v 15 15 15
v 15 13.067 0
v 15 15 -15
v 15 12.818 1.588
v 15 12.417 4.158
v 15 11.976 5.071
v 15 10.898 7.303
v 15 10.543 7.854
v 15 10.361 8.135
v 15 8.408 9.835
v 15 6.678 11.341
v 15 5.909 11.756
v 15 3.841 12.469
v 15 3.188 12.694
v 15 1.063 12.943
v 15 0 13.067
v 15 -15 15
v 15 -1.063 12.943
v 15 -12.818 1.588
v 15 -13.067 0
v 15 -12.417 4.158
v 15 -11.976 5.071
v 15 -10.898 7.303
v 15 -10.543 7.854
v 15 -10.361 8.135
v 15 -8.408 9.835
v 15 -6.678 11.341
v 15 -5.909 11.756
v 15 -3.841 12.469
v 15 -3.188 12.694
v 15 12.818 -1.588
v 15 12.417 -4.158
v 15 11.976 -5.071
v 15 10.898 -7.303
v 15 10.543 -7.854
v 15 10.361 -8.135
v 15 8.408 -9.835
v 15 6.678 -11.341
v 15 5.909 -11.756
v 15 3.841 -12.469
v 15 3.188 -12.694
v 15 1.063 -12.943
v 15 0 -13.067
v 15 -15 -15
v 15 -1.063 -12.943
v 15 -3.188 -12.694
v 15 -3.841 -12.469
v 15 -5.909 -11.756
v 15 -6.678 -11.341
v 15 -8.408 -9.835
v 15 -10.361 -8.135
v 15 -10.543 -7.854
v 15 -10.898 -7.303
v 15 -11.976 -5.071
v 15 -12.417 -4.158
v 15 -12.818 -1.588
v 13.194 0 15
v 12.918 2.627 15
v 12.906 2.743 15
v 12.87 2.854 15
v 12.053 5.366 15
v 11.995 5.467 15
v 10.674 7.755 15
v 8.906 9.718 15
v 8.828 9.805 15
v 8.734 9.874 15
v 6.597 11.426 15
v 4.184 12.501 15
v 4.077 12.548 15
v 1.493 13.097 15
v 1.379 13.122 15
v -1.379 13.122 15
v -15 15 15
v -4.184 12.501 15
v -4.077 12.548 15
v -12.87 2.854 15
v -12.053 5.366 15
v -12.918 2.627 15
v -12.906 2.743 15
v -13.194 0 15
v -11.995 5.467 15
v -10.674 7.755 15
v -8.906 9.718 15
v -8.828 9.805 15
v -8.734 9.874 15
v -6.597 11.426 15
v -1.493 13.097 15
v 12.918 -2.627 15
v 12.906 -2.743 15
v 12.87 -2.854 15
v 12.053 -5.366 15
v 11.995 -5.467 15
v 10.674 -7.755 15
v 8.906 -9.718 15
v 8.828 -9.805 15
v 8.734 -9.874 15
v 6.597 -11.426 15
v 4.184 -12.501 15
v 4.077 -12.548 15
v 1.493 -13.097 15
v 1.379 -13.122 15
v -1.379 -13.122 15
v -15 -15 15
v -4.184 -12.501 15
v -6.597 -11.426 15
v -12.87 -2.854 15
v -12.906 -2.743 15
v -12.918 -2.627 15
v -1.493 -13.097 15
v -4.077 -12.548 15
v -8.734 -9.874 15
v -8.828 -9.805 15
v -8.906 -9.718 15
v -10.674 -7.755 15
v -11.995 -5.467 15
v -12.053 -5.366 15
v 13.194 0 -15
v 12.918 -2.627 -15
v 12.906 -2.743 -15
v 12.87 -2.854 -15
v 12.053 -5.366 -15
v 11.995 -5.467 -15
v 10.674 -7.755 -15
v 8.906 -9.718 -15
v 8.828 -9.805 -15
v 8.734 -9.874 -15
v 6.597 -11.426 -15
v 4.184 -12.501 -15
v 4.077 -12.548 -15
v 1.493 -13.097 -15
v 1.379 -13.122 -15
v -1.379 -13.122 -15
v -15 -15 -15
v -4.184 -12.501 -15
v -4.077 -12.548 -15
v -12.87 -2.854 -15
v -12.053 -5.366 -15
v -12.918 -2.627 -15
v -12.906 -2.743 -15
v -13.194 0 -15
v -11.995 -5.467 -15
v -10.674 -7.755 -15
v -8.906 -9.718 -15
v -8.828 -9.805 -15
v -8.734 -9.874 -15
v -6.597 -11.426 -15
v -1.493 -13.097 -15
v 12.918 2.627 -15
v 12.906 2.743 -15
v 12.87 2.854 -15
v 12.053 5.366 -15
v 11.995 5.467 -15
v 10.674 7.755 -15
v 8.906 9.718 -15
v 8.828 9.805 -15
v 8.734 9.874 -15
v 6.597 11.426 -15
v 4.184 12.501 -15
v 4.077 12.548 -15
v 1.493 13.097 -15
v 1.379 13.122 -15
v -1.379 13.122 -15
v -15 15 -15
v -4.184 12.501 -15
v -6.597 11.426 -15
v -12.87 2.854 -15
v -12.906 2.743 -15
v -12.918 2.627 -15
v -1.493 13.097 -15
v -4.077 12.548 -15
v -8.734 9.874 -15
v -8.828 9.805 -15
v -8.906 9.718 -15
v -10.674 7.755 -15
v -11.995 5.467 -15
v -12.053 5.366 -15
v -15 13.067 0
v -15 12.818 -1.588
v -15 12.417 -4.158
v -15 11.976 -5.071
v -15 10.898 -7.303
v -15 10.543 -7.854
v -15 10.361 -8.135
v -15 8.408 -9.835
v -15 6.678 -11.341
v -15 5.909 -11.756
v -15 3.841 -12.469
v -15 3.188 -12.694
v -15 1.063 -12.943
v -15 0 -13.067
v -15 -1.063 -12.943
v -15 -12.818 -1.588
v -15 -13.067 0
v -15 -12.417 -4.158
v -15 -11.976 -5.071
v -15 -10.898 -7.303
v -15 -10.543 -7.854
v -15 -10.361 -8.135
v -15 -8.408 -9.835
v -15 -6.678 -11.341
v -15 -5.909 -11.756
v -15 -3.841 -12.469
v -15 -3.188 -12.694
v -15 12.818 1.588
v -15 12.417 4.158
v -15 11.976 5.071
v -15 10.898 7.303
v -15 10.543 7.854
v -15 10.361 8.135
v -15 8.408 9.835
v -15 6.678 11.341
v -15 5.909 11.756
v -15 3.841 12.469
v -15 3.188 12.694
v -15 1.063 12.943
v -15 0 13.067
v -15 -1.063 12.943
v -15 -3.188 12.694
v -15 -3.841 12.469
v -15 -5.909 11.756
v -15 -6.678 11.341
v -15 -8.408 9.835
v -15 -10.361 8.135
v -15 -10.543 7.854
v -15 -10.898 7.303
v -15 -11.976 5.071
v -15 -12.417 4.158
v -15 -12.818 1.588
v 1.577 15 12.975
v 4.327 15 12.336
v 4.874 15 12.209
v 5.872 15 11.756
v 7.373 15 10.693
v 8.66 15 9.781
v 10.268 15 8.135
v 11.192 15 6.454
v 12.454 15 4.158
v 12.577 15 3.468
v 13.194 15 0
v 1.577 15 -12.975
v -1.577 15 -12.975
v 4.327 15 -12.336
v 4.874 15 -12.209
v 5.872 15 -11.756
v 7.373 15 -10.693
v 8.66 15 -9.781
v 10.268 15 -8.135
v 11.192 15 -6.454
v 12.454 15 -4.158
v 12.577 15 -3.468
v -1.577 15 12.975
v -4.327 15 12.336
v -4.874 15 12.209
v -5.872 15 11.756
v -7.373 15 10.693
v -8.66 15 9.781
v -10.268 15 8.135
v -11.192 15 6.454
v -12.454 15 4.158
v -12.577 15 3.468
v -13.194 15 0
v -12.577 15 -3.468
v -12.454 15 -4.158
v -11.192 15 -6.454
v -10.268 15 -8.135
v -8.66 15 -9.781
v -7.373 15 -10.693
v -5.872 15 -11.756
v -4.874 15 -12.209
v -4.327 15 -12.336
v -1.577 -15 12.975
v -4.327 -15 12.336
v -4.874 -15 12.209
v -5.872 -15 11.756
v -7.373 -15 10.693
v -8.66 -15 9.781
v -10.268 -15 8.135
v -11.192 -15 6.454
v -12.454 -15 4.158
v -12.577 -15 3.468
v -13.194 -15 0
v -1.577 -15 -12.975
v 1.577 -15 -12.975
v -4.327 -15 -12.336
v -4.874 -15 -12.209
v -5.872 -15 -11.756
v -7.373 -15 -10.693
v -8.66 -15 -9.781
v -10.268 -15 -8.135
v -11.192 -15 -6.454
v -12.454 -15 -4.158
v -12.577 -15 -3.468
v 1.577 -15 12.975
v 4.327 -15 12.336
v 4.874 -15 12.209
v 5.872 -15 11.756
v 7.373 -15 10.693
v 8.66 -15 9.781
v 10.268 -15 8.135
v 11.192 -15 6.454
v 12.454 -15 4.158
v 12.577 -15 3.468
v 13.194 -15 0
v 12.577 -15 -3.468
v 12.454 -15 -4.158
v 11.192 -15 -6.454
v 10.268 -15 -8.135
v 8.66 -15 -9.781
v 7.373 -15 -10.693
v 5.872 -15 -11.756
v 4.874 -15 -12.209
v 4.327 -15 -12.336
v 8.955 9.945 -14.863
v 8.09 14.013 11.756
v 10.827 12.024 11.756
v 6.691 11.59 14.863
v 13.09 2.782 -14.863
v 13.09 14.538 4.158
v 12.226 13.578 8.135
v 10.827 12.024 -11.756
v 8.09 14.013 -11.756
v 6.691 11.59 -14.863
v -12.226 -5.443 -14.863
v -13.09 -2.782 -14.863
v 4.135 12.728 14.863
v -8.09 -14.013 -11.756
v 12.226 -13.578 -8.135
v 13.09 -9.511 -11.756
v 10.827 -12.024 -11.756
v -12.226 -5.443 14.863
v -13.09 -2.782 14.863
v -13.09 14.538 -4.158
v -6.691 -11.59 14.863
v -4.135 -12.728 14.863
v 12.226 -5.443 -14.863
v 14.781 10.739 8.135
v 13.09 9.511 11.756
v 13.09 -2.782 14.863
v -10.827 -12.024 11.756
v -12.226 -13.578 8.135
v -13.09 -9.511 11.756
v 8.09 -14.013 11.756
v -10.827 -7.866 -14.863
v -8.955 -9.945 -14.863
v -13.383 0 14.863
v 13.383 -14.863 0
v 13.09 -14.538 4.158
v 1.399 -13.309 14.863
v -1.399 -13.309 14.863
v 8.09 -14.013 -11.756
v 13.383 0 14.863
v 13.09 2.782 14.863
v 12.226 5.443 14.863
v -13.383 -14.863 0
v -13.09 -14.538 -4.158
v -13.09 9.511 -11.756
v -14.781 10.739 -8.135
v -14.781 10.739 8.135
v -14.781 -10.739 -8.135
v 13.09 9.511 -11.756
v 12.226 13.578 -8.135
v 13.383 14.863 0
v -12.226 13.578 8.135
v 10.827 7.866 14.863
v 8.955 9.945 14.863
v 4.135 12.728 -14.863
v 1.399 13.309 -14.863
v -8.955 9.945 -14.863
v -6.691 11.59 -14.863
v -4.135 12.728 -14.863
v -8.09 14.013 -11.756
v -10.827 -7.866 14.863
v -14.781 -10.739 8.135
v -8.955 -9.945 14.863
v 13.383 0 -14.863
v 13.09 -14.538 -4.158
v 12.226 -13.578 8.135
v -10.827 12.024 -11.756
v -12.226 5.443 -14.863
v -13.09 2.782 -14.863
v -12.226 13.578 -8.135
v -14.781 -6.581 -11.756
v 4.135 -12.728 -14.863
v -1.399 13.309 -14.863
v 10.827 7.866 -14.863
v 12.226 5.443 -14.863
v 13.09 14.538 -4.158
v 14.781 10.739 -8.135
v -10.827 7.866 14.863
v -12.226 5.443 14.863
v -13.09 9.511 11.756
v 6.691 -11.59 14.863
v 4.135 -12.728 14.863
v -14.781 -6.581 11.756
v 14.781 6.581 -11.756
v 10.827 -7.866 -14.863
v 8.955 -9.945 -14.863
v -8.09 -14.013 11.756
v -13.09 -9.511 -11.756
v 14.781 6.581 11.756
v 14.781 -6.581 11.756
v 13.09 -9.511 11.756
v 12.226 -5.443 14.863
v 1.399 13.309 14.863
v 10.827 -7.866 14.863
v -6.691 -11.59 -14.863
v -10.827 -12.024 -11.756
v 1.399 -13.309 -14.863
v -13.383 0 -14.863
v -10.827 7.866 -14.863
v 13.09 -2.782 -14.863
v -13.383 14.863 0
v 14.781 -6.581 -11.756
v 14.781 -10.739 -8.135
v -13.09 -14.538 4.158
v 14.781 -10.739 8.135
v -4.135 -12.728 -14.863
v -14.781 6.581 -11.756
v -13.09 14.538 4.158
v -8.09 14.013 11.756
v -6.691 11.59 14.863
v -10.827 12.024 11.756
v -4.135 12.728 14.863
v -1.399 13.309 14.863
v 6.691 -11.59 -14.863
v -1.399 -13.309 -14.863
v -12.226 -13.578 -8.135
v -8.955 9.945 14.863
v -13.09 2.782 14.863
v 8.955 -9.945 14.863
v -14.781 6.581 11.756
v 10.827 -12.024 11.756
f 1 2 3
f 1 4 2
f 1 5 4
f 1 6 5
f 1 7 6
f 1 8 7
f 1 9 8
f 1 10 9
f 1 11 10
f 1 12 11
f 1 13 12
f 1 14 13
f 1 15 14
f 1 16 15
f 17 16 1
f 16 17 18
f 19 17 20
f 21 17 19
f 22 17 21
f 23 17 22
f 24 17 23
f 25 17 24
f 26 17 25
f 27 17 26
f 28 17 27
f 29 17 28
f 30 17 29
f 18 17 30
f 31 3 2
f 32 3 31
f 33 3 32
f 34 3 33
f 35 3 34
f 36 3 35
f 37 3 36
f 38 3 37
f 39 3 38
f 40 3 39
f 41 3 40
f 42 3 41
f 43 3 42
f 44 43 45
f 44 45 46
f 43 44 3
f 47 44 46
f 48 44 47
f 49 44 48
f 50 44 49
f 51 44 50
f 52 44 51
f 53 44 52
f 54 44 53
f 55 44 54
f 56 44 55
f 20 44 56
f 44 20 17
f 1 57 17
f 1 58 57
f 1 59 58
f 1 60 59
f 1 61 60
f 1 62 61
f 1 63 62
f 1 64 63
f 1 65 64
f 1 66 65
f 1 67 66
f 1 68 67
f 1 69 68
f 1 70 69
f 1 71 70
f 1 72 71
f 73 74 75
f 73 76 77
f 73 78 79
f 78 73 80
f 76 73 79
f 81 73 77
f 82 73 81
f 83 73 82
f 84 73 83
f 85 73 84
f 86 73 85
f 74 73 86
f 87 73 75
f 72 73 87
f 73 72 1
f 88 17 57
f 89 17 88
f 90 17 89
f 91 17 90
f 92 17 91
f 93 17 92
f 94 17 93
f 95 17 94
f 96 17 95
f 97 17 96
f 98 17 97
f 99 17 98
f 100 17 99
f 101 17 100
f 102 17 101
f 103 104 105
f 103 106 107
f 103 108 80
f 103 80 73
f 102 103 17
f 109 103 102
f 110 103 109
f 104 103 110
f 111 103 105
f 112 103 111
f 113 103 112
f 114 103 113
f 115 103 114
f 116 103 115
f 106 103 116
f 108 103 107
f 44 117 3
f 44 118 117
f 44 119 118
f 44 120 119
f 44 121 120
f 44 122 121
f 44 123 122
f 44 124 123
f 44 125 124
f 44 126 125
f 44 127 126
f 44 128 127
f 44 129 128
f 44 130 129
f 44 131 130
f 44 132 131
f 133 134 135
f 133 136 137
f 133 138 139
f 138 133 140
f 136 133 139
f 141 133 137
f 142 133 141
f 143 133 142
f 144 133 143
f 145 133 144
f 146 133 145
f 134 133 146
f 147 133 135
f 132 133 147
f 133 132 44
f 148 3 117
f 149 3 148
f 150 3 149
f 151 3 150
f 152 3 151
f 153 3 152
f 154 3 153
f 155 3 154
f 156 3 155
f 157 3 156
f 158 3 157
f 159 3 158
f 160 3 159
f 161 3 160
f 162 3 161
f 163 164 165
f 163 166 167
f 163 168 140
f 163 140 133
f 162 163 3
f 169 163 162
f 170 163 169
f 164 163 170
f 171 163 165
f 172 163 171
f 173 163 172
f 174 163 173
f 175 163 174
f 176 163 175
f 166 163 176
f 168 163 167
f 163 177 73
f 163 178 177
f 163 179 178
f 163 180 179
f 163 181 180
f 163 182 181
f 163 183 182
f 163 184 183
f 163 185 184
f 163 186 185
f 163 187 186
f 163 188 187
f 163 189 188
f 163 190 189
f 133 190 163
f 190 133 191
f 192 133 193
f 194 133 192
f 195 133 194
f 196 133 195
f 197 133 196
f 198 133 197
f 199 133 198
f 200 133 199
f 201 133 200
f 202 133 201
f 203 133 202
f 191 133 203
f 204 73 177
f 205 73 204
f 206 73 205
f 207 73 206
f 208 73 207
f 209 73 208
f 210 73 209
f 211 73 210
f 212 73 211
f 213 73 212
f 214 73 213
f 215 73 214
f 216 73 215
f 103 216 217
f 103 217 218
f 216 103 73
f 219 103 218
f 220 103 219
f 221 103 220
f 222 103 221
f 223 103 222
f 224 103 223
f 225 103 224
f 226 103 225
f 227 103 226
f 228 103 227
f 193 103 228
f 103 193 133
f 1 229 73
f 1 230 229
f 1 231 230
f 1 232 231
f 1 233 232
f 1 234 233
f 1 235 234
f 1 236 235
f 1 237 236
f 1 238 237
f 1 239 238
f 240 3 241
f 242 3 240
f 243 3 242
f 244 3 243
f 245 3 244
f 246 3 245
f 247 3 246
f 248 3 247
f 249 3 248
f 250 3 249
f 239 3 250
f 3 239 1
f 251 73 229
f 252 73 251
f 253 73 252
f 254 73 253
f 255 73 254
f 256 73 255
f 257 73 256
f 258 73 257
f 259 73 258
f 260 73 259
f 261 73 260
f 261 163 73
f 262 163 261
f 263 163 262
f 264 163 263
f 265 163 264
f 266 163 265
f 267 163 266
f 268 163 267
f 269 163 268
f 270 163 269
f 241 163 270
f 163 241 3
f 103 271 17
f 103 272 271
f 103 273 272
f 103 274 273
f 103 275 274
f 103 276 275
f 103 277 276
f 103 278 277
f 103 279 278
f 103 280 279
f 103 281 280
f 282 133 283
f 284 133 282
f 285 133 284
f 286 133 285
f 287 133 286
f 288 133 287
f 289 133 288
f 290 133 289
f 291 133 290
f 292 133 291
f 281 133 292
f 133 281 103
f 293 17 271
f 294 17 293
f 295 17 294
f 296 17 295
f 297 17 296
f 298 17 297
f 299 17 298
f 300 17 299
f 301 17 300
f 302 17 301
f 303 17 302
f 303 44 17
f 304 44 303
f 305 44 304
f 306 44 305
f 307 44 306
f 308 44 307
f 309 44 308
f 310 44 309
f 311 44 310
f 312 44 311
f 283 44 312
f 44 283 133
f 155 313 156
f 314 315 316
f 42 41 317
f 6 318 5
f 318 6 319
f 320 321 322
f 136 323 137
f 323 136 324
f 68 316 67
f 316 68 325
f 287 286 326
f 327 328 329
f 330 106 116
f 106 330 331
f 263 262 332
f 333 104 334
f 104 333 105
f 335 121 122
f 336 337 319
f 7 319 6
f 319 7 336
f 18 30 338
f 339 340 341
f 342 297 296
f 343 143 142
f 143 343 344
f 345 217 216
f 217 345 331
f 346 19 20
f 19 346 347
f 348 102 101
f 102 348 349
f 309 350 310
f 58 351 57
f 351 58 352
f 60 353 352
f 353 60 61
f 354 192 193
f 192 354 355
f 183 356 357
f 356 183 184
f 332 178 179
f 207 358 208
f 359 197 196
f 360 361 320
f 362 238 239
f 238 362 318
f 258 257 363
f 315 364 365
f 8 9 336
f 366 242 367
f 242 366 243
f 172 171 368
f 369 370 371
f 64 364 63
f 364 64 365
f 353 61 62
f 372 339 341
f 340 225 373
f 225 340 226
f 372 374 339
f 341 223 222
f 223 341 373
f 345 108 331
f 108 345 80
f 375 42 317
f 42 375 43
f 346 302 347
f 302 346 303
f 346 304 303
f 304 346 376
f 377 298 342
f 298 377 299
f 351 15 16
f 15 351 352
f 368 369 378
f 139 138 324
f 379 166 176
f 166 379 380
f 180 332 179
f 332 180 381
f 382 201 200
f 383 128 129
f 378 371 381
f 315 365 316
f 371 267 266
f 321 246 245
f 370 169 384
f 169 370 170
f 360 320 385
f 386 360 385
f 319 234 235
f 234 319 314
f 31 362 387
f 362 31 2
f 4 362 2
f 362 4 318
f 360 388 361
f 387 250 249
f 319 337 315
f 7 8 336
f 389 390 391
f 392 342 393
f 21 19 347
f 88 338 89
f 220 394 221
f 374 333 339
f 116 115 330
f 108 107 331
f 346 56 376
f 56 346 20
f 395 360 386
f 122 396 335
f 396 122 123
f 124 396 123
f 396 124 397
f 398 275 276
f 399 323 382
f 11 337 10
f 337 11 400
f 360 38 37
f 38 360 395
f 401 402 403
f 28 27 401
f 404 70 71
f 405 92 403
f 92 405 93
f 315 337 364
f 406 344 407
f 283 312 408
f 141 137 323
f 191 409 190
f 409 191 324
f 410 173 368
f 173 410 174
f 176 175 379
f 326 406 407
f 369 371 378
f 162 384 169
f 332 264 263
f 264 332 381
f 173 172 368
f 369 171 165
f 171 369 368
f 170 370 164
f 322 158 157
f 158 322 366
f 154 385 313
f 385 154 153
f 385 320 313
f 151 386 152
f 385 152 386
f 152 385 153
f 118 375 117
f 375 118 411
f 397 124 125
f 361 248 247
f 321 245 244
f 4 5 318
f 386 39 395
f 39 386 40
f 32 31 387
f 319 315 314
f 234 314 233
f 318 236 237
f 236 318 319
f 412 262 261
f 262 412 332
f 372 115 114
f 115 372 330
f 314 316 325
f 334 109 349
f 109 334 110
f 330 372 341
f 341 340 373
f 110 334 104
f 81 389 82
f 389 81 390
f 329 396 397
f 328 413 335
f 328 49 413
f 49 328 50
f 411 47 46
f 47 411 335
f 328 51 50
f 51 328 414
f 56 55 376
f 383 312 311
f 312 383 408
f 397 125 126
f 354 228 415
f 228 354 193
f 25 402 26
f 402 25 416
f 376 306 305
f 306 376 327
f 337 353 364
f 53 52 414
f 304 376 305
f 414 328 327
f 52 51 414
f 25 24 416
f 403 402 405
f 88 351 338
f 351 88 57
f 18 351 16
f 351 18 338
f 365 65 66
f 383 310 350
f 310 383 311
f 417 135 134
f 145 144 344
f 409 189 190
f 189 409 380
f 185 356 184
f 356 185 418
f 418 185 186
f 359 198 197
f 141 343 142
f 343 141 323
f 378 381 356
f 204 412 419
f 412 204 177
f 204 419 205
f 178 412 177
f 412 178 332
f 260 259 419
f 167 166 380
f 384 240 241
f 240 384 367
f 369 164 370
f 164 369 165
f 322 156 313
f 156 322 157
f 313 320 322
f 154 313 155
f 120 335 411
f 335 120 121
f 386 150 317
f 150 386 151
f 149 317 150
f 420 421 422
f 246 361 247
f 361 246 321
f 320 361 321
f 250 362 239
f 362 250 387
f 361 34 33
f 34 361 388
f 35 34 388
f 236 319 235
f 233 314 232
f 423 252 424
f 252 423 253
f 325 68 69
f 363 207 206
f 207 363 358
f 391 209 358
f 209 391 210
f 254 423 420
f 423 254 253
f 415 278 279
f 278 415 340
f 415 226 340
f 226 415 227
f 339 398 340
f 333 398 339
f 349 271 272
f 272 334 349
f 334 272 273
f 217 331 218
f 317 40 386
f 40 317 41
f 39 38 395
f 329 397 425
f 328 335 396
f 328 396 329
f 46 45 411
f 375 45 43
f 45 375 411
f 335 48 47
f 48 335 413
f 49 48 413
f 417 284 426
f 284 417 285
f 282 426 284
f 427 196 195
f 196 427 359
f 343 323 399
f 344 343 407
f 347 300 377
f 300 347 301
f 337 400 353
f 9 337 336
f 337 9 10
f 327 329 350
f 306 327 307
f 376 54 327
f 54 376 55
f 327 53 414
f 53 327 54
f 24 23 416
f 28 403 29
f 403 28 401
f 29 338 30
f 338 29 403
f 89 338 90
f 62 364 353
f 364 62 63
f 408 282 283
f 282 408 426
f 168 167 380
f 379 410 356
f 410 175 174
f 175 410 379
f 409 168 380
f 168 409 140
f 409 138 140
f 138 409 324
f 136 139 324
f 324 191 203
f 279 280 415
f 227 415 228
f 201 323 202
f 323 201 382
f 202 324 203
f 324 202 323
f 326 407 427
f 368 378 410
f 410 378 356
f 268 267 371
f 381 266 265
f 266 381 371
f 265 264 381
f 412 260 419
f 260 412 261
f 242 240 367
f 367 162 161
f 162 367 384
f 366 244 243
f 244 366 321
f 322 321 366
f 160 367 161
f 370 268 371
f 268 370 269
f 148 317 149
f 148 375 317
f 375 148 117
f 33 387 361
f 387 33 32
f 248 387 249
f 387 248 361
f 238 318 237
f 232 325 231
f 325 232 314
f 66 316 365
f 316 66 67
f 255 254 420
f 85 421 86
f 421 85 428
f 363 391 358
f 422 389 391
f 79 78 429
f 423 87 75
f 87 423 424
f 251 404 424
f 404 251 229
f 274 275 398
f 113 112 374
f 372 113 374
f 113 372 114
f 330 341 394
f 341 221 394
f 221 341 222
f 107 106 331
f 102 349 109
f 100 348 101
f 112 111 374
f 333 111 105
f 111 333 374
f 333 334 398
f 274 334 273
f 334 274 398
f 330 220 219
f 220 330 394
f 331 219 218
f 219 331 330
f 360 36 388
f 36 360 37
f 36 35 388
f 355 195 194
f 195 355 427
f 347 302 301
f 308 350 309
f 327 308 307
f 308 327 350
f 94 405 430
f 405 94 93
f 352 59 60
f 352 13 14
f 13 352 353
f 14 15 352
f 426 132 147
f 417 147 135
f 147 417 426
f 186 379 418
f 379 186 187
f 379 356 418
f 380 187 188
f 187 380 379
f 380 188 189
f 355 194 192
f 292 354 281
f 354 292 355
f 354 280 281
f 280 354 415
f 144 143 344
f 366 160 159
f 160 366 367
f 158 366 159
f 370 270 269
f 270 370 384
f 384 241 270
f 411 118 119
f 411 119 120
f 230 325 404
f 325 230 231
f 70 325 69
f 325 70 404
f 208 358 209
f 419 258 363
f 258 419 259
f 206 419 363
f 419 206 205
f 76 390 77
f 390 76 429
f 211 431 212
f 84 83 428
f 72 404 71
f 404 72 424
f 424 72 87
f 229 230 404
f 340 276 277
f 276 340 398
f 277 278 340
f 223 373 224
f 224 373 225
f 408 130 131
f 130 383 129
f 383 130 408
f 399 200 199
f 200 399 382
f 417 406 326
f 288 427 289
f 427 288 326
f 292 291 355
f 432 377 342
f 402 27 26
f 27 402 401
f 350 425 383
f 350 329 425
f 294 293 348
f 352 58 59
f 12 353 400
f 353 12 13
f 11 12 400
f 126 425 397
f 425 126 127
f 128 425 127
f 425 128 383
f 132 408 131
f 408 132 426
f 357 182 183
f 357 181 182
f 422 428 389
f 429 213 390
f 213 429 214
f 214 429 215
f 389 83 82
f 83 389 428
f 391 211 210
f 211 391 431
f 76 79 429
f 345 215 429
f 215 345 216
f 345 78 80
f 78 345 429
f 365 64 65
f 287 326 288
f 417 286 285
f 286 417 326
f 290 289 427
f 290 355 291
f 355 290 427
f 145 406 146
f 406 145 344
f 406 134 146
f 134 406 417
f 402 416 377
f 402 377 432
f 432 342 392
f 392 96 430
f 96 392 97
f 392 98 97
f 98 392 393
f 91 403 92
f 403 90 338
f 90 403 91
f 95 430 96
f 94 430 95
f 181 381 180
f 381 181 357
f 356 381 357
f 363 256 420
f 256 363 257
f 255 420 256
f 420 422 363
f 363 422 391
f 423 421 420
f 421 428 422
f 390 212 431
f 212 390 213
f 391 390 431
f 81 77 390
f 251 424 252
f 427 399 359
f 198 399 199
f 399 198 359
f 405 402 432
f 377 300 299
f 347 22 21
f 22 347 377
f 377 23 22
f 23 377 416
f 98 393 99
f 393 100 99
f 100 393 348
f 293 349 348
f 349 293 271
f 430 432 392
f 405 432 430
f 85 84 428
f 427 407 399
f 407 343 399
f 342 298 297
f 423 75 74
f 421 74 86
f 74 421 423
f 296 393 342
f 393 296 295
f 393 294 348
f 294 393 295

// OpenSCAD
module difference_cube()
{
	difference() {
		cube(30, center = true);
		sphere(20);
	}
}

difference_cube();
